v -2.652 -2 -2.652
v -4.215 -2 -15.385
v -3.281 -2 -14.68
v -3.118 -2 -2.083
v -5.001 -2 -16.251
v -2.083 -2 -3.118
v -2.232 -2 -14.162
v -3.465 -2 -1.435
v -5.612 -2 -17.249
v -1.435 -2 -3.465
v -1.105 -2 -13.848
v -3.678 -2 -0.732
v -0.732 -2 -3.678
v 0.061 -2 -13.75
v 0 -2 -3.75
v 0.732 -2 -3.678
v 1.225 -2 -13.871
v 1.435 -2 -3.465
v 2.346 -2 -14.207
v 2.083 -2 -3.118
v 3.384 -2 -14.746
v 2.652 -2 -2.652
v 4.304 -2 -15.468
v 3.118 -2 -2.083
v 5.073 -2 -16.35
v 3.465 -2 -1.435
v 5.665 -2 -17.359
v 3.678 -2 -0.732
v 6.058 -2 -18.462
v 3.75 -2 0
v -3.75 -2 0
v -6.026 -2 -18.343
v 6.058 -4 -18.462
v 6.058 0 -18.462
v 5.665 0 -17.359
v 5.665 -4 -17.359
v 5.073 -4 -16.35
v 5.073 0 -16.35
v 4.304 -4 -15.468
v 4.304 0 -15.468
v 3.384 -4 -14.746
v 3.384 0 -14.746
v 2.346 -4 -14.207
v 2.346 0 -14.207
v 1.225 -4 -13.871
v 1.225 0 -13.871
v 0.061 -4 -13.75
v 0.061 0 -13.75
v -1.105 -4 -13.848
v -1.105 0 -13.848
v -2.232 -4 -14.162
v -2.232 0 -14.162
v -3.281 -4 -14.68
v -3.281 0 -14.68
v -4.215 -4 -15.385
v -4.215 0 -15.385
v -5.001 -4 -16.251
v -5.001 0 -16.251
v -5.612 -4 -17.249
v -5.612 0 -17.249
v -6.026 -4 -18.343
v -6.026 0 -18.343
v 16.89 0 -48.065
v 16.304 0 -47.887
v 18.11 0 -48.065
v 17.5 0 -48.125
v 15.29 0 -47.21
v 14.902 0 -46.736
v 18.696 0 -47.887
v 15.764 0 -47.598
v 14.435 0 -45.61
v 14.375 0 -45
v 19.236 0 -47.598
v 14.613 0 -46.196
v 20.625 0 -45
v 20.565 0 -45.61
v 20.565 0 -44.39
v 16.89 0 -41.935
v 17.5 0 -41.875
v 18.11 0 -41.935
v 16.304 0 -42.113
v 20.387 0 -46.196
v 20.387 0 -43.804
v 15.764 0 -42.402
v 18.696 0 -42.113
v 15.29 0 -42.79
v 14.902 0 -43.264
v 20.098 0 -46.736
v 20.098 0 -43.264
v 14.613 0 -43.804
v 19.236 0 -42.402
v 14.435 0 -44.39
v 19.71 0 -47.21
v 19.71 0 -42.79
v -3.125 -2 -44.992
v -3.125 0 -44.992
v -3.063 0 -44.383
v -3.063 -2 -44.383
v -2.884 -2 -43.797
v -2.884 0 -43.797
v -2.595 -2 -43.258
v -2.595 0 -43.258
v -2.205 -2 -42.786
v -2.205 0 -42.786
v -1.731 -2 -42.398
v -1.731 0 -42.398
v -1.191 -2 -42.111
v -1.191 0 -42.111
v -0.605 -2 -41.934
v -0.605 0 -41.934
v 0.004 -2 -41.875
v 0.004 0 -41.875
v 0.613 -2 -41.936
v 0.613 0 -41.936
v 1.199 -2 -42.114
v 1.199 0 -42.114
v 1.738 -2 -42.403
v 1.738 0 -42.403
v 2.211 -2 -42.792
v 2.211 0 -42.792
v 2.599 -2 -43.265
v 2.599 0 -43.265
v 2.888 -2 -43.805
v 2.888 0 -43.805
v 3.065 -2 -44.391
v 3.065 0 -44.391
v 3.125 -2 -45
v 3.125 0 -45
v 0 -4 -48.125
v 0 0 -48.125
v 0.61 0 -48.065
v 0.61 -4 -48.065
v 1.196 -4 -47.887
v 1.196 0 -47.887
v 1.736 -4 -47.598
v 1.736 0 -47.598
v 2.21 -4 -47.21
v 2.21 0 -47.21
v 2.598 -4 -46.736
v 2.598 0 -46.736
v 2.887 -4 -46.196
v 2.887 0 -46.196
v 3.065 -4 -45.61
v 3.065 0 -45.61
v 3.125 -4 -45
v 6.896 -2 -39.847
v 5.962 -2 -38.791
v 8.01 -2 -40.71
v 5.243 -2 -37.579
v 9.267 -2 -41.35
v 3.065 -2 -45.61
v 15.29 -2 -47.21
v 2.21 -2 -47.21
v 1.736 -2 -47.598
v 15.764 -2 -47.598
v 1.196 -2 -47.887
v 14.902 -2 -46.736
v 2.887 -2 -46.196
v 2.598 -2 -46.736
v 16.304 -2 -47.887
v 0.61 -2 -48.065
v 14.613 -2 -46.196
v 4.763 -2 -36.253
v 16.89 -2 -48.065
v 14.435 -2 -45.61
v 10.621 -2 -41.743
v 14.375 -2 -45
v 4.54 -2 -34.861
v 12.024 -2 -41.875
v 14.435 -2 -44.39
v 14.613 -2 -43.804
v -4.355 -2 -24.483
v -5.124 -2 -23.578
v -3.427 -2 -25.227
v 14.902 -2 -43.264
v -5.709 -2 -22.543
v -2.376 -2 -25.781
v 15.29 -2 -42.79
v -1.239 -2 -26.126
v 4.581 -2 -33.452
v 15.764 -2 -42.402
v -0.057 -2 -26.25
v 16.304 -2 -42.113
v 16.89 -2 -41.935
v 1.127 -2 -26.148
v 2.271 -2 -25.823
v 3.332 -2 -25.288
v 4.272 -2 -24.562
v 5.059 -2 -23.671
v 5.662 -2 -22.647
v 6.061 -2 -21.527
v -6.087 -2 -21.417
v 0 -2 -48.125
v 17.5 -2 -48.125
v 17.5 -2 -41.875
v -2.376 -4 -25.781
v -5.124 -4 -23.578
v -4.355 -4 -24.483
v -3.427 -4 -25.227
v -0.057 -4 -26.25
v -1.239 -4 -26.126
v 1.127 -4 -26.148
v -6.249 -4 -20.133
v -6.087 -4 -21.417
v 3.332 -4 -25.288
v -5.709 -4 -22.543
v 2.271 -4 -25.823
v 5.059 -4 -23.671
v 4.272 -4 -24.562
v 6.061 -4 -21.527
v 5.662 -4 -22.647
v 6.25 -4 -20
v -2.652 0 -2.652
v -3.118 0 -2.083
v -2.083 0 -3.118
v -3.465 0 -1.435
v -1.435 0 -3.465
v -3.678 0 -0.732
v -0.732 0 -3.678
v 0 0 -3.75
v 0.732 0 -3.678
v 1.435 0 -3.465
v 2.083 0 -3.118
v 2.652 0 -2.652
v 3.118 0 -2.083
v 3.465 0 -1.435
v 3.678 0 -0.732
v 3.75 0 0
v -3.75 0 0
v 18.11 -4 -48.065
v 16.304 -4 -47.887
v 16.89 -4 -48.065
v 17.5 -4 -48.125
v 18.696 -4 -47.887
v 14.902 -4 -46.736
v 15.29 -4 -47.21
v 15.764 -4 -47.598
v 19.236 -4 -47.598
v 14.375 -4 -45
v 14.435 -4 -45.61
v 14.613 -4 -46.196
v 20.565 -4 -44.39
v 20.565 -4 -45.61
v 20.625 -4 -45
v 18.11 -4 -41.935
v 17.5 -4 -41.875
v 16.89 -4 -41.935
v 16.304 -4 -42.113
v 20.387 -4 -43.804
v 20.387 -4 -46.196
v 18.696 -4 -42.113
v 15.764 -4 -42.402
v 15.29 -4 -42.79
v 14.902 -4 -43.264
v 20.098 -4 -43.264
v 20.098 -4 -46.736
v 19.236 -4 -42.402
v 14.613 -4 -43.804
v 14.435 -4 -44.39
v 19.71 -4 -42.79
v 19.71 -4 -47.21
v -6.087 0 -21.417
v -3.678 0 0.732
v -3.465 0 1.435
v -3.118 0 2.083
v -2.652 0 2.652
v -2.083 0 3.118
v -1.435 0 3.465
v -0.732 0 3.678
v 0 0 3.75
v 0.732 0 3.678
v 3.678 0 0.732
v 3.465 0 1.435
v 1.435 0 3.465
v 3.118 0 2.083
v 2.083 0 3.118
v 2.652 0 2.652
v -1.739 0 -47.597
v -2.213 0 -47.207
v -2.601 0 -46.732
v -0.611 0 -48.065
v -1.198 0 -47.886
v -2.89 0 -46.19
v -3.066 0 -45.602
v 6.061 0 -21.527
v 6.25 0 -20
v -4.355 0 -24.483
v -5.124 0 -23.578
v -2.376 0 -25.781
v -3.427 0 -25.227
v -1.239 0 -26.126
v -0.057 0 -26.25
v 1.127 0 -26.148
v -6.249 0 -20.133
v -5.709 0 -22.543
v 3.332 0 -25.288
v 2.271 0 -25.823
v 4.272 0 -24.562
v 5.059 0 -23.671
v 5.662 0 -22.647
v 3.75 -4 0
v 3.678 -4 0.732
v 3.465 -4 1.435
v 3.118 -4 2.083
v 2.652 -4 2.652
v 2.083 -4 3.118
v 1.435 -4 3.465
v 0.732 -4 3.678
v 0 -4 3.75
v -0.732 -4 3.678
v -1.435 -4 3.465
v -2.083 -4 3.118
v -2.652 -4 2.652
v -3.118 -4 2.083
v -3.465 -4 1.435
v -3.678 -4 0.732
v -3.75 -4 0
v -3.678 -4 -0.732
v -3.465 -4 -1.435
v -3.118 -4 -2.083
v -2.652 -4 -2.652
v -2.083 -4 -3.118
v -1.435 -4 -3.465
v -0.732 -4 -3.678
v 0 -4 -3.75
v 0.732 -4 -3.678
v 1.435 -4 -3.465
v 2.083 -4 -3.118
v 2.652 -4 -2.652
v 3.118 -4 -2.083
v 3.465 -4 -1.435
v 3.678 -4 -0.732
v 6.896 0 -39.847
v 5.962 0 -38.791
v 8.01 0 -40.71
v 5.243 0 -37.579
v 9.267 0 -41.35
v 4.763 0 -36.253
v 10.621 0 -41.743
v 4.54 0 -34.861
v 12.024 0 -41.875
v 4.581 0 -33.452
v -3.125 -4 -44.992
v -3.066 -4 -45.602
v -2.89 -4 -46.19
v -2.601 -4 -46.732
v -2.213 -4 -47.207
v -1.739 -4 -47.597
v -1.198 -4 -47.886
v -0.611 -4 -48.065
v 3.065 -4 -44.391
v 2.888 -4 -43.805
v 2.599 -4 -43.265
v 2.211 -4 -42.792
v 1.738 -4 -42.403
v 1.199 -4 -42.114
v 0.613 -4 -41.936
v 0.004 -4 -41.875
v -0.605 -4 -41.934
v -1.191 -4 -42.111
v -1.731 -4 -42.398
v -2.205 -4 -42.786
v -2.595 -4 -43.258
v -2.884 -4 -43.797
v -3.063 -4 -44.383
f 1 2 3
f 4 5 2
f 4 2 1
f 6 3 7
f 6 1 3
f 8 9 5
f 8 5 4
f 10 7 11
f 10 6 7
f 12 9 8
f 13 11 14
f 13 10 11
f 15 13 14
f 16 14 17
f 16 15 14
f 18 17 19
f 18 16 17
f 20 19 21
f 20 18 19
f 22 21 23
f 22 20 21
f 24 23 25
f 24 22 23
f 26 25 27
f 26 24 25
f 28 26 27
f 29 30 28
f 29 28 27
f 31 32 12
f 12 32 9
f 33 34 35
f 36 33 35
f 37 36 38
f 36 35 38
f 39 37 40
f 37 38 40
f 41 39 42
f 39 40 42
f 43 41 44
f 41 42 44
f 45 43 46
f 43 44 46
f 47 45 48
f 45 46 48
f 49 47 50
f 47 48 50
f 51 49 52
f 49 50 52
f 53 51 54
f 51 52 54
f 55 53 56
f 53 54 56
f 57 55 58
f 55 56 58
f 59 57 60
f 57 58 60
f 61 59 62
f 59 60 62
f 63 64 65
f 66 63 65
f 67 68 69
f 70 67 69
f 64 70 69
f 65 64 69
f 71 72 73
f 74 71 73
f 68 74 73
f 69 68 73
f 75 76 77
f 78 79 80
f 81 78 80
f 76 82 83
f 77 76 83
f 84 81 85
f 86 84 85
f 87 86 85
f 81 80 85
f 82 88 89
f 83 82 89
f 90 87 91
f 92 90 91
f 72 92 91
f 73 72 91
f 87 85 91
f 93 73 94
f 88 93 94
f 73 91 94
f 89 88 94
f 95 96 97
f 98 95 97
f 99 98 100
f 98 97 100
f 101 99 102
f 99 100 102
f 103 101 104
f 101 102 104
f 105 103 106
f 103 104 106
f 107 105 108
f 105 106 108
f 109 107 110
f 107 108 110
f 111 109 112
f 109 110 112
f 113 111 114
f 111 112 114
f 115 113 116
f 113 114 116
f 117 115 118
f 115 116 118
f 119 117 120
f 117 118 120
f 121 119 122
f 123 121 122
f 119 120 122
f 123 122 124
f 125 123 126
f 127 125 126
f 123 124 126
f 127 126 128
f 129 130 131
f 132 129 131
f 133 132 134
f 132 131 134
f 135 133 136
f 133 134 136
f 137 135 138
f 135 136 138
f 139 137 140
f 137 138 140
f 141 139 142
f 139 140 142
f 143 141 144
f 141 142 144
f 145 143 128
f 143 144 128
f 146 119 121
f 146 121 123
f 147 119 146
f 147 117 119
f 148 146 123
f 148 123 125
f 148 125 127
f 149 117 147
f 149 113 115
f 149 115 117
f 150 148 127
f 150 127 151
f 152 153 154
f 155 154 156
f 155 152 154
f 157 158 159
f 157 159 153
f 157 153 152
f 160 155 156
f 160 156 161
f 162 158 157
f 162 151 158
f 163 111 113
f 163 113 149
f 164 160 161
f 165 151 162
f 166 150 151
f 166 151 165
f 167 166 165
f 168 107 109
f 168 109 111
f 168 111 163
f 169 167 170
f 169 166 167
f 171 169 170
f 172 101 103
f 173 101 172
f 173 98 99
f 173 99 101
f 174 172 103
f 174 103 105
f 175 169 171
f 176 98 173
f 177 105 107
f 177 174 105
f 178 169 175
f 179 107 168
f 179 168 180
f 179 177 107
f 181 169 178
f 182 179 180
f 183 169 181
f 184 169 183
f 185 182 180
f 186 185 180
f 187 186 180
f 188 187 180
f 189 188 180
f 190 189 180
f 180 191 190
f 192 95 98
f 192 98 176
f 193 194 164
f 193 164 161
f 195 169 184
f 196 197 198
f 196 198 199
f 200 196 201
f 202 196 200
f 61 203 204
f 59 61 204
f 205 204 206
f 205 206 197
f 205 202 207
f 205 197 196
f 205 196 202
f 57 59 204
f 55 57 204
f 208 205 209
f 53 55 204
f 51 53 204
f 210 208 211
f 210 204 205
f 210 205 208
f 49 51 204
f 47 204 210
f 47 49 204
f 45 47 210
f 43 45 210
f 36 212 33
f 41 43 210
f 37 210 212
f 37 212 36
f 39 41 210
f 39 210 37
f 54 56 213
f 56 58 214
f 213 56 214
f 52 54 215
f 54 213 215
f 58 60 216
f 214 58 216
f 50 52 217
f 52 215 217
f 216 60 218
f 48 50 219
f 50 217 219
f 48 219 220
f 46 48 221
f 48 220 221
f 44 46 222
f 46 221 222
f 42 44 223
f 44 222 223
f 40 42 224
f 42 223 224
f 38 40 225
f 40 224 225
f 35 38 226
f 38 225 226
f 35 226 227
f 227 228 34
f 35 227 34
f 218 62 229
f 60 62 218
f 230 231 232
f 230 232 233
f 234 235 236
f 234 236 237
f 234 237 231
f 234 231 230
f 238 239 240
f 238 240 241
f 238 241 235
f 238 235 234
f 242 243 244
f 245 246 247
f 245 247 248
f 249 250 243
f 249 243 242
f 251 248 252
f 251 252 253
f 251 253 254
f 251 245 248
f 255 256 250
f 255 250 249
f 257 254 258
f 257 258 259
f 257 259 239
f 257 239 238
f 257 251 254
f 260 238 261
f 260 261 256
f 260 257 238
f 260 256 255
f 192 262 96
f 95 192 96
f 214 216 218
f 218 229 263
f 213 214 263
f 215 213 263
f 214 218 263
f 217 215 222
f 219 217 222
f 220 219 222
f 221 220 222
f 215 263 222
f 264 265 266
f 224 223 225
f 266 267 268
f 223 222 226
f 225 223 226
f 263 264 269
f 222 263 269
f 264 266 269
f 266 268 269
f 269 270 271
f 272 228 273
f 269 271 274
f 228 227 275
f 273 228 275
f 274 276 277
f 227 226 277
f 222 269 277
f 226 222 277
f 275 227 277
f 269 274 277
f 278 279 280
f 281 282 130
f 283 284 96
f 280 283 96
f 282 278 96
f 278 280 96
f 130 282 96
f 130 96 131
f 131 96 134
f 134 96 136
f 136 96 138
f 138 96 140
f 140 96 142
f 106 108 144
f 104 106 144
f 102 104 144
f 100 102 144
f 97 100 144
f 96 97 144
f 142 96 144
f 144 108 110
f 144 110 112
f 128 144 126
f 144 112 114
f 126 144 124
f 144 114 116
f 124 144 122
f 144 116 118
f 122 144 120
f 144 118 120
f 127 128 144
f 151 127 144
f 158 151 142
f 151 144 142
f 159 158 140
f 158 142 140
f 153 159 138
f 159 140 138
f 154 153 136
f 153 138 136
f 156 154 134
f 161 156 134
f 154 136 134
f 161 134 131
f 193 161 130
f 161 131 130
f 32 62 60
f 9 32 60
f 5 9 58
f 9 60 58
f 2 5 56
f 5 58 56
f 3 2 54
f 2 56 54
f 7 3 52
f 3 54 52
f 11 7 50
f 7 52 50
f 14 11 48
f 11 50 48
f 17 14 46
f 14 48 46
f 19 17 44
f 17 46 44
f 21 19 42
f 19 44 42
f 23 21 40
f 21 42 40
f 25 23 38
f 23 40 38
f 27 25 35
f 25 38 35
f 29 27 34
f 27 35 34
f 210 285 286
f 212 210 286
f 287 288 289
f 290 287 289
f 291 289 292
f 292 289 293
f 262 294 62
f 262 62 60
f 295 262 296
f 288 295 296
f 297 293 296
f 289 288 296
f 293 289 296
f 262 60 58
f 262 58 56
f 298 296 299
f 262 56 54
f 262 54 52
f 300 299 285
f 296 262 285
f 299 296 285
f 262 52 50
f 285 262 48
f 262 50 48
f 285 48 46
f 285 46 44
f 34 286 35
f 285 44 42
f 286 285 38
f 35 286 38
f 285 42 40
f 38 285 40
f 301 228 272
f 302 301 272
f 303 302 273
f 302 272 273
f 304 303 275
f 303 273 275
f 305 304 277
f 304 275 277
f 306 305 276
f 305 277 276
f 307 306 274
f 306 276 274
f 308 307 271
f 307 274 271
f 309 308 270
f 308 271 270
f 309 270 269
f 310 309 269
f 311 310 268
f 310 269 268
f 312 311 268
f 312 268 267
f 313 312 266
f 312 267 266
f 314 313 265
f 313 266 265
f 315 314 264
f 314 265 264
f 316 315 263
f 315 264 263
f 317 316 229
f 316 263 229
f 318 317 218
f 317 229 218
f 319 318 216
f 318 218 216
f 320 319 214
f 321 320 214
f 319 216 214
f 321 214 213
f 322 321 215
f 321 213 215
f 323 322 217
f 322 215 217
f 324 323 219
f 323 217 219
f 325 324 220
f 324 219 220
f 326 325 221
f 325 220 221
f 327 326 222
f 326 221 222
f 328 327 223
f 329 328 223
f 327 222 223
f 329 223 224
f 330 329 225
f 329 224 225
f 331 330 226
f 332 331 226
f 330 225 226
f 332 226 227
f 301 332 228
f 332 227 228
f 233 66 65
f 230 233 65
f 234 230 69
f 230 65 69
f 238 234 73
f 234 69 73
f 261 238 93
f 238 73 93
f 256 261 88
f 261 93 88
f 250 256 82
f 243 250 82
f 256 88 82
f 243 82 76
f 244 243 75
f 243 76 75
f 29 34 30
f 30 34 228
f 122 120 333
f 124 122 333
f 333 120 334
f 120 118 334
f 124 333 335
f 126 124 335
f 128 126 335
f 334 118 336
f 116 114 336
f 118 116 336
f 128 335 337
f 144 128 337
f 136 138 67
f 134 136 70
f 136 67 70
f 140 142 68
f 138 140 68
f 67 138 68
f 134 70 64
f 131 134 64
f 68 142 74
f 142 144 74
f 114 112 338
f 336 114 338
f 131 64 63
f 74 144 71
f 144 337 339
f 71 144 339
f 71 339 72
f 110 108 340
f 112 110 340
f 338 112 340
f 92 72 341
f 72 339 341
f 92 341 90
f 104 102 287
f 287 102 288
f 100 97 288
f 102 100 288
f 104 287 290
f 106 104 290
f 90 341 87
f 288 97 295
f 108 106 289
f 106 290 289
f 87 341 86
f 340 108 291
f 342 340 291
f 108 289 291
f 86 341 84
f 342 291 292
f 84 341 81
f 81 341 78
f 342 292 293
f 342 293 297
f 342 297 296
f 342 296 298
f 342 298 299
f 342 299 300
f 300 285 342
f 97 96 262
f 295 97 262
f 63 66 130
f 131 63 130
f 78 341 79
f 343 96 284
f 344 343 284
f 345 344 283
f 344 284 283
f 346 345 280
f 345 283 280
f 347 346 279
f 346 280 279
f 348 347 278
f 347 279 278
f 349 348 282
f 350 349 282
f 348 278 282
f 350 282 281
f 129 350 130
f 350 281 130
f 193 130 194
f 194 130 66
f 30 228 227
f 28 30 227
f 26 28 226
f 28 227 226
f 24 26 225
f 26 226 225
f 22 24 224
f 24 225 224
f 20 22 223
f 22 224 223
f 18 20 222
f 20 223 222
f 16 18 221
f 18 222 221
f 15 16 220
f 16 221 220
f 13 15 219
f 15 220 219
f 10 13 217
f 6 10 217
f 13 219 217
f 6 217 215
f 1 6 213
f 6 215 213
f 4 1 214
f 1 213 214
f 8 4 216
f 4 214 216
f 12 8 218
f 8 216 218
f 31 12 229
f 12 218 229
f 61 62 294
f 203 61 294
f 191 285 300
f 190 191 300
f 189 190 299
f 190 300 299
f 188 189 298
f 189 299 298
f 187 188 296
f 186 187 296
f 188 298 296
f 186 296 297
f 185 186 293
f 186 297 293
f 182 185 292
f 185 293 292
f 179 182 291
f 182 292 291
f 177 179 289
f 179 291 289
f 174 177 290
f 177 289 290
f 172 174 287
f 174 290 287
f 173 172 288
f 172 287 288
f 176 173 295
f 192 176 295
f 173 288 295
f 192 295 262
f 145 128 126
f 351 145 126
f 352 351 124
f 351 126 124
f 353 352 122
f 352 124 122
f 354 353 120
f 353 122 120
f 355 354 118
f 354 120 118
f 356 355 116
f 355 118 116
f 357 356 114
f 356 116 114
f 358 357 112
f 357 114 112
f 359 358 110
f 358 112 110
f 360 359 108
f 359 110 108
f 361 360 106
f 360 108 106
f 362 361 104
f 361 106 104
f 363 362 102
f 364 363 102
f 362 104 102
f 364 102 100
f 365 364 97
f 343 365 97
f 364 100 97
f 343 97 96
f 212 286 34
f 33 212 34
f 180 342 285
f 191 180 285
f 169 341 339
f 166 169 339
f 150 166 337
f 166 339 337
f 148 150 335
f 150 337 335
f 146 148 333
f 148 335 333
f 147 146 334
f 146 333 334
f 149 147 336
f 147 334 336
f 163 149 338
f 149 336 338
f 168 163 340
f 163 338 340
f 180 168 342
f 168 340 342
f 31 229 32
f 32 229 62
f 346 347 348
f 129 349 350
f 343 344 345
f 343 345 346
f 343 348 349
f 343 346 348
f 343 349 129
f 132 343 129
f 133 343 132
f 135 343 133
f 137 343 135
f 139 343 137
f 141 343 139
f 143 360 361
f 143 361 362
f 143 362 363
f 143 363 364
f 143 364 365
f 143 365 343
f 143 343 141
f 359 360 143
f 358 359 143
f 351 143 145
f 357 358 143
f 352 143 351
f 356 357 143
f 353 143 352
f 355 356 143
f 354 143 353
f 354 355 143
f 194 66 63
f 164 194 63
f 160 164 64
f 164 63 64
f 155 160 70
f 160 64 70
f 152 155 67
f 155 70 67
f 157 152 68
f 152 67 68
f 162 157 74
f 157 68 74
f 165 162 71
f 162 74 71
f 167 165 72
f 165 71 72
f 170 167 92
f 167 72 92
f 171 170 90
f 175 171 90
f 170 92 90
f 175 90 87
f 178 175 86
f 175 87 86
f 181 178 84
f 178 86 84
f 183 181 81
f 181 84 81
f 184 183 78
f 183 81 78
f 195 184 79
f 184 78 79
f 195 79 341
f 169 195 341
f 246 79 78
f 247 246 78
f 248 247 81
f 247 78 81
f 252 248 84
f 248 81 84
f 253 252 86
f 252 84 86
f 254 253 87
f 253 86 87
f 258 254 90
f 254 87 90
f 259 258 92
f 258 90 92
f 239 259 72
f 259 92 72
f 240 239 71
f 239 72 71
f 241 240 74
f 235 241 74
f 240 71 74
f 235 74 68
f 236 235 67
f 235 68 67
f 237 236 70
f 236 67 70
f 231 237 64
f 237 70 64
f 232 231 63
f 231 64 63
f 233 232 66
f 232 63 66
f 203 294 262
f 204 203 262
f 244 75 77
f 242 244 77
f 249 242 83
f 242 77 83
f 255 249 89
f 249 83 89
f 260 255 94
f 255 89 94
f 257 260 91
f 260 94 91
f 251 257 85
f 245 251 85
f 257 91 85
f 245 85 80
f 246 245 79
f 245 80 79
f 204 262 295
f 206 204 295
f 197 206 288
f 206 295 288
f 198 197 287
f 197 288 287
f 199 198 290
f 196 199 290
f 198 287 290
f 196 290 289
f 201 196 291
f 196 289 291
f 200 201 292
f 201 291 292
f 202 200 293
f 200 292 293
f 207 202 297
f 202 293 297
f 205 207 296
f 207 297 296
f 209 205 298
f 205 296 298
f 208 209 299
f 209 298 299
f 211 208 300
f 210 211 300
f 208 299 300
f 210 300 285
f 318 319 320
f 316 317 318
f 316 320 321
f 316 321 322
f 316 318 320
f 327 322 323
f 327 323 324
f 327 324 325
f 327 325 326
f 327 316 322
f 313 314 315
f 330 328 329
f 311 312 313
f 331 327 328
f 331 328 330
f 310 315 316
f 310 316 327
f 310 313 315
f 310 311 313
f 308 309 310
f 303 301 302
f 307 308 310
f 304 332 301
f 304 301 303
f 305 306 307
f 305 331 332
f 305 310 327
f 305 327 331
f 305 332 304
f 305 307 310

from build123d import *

# Parameters (mm, degrees)
F1_DEPTH = 2
F2_DEPTH = 4


with BuildPart() as f1:
    # F0 (on Front) → F1 (new body)
    with BuildSketch(Plane.XZ):
        with BuildLine():
            Line((6.0576923077, -18.4615384615), (3.75, 0))
            ThreePointArc((3.75, 0), (0, -3.75), (-3.75, 0))
            Line((-3.75, 0), (-6.0264121951, -18.3432392886))
            ThreePointArc((-6.0264121951, -18.3432392886), (0.0611823908, -13.75029947), (6.0576923077, -18.4615384615))
        make_face()
    extrude(amount=F1_DEPTH)


with BuildPart() as f1b:
    # F0 (on Front) → F1, piece 2 (new body)
    with BuildSketch(Plane.XZ):
        with BuildLine():
            Line((4.581416472, -33.451760418), (6.0605841498, -21.5270297191))
            ThreePointArc((6.0605841498, -21.5270297191), (-0.0567793323, -26.2497420833), (-6.0873278177, -21.416665112))
            Line((-6.0873278177, -21.416665112), (-3.1249885099, -44.9915257414))
            ThreePointArc((-3.1249885099, -44.9915257414), (0.0042371332, -41.8750028725), (3.125, -45))
            ThreePointArc((3.125, -45), (2.2097086912, -47.2097086912), (0, -48.125))
            Line((0, -48.125), (17.5, -48.125))
            ThreePointArc((17.5, -48.125), (14.375, -45), (17.5, -41.875))
            Line((17.5, -41.875), (12.0243748001, -41.875))
            ThreePointArc((12.0243748001, -41.875), (6.404130283, -39.3411707147), (4.581416472, -33.451760418))
        make_face()
    extrude(amount=F1_DEPTH)


with BuildPart() as f2:
    # F0 (on Front) → F2 (new body)
    with BuildSketch(Plane.XZ):
        with BuildLine():
            ThreePointArc((-3.75, 0), (0, -3.75), (3.75, 0))
            ThreePointArc((3.75, 0), (0, 3.75), (-3.75, 0))
        make_face()
    extrude(amount=F2_DEPTH)


with BuildPart() as f2b:
    # F0 (on Front) → F2, piece 2 (new body)
    with BuildSketch(Plane.XZ):
        with BuildLine():
            Line((6.25, -20), (6.0576923077, -18.4615384615))
            ThreePointArc((6.0576923077, -18.4615384615), (0.0611823908, -13.75029947), (-6.0264121951, -18.3432392886))
            Line((-6.0264121951, -18.3432392886), (-6.2485756833, -20.1334238753))
            Line((-6.2485756833, -20.1334238753), (-6.0873278177, -21.416665112))
            ThreePointArc((-6.0873278177, -21.416665112), (-0.0567793323, -26.2497420833), (6.0605841498, -21.5270297191))
            Line((6.0605841498, -21.5270297191), (6.25, -20))
        make_face()
    extrude(amount=F2_DEPTH)


with BuildPart() as f2c:
    # F0 (on Front) → F2, piece 3 (new body)
    with BuildSketch(Plane.XZ):
        with BuildLine():
            ThreePointArc((3.125, -45), (0.0042371332, -41.8750028725), (-3.1249885099, -44.9915257414))
            ThreePointArc((-3.1249885099, -44.9915257414), (-2.2127027657, -47.2067105544), (0, -48.125))
            ThreePointArc((0, -48.125), (2.2097086912, -47.2097086912), (3.125, -45))
        make_face()
    extrude(amount=F2_DEPTH)


with BuildPart() as f2d:
    # F0 (on Front) → F2, piece 4 (new body)
    with BuildSketch(Plane.XZ):
        with BuildLine():
            ThreePointArc((20.625, -45), (19.7097086912, -42.7902913088), (17.5, -41.875))
            ThreePointArc((17.5, -41.875), (14.375, -45), (17.5, -48.125))
            ThreePointArc((17.5, -48.125), (19.7097086912, -47.2097086912), (20.625, -45))
        make_face()
    extrude(amount=F2_DEPTH)


solid = Compound([f1.part, f1b.part, f2.part, f2b.part, f2c.part, f2d.part])
